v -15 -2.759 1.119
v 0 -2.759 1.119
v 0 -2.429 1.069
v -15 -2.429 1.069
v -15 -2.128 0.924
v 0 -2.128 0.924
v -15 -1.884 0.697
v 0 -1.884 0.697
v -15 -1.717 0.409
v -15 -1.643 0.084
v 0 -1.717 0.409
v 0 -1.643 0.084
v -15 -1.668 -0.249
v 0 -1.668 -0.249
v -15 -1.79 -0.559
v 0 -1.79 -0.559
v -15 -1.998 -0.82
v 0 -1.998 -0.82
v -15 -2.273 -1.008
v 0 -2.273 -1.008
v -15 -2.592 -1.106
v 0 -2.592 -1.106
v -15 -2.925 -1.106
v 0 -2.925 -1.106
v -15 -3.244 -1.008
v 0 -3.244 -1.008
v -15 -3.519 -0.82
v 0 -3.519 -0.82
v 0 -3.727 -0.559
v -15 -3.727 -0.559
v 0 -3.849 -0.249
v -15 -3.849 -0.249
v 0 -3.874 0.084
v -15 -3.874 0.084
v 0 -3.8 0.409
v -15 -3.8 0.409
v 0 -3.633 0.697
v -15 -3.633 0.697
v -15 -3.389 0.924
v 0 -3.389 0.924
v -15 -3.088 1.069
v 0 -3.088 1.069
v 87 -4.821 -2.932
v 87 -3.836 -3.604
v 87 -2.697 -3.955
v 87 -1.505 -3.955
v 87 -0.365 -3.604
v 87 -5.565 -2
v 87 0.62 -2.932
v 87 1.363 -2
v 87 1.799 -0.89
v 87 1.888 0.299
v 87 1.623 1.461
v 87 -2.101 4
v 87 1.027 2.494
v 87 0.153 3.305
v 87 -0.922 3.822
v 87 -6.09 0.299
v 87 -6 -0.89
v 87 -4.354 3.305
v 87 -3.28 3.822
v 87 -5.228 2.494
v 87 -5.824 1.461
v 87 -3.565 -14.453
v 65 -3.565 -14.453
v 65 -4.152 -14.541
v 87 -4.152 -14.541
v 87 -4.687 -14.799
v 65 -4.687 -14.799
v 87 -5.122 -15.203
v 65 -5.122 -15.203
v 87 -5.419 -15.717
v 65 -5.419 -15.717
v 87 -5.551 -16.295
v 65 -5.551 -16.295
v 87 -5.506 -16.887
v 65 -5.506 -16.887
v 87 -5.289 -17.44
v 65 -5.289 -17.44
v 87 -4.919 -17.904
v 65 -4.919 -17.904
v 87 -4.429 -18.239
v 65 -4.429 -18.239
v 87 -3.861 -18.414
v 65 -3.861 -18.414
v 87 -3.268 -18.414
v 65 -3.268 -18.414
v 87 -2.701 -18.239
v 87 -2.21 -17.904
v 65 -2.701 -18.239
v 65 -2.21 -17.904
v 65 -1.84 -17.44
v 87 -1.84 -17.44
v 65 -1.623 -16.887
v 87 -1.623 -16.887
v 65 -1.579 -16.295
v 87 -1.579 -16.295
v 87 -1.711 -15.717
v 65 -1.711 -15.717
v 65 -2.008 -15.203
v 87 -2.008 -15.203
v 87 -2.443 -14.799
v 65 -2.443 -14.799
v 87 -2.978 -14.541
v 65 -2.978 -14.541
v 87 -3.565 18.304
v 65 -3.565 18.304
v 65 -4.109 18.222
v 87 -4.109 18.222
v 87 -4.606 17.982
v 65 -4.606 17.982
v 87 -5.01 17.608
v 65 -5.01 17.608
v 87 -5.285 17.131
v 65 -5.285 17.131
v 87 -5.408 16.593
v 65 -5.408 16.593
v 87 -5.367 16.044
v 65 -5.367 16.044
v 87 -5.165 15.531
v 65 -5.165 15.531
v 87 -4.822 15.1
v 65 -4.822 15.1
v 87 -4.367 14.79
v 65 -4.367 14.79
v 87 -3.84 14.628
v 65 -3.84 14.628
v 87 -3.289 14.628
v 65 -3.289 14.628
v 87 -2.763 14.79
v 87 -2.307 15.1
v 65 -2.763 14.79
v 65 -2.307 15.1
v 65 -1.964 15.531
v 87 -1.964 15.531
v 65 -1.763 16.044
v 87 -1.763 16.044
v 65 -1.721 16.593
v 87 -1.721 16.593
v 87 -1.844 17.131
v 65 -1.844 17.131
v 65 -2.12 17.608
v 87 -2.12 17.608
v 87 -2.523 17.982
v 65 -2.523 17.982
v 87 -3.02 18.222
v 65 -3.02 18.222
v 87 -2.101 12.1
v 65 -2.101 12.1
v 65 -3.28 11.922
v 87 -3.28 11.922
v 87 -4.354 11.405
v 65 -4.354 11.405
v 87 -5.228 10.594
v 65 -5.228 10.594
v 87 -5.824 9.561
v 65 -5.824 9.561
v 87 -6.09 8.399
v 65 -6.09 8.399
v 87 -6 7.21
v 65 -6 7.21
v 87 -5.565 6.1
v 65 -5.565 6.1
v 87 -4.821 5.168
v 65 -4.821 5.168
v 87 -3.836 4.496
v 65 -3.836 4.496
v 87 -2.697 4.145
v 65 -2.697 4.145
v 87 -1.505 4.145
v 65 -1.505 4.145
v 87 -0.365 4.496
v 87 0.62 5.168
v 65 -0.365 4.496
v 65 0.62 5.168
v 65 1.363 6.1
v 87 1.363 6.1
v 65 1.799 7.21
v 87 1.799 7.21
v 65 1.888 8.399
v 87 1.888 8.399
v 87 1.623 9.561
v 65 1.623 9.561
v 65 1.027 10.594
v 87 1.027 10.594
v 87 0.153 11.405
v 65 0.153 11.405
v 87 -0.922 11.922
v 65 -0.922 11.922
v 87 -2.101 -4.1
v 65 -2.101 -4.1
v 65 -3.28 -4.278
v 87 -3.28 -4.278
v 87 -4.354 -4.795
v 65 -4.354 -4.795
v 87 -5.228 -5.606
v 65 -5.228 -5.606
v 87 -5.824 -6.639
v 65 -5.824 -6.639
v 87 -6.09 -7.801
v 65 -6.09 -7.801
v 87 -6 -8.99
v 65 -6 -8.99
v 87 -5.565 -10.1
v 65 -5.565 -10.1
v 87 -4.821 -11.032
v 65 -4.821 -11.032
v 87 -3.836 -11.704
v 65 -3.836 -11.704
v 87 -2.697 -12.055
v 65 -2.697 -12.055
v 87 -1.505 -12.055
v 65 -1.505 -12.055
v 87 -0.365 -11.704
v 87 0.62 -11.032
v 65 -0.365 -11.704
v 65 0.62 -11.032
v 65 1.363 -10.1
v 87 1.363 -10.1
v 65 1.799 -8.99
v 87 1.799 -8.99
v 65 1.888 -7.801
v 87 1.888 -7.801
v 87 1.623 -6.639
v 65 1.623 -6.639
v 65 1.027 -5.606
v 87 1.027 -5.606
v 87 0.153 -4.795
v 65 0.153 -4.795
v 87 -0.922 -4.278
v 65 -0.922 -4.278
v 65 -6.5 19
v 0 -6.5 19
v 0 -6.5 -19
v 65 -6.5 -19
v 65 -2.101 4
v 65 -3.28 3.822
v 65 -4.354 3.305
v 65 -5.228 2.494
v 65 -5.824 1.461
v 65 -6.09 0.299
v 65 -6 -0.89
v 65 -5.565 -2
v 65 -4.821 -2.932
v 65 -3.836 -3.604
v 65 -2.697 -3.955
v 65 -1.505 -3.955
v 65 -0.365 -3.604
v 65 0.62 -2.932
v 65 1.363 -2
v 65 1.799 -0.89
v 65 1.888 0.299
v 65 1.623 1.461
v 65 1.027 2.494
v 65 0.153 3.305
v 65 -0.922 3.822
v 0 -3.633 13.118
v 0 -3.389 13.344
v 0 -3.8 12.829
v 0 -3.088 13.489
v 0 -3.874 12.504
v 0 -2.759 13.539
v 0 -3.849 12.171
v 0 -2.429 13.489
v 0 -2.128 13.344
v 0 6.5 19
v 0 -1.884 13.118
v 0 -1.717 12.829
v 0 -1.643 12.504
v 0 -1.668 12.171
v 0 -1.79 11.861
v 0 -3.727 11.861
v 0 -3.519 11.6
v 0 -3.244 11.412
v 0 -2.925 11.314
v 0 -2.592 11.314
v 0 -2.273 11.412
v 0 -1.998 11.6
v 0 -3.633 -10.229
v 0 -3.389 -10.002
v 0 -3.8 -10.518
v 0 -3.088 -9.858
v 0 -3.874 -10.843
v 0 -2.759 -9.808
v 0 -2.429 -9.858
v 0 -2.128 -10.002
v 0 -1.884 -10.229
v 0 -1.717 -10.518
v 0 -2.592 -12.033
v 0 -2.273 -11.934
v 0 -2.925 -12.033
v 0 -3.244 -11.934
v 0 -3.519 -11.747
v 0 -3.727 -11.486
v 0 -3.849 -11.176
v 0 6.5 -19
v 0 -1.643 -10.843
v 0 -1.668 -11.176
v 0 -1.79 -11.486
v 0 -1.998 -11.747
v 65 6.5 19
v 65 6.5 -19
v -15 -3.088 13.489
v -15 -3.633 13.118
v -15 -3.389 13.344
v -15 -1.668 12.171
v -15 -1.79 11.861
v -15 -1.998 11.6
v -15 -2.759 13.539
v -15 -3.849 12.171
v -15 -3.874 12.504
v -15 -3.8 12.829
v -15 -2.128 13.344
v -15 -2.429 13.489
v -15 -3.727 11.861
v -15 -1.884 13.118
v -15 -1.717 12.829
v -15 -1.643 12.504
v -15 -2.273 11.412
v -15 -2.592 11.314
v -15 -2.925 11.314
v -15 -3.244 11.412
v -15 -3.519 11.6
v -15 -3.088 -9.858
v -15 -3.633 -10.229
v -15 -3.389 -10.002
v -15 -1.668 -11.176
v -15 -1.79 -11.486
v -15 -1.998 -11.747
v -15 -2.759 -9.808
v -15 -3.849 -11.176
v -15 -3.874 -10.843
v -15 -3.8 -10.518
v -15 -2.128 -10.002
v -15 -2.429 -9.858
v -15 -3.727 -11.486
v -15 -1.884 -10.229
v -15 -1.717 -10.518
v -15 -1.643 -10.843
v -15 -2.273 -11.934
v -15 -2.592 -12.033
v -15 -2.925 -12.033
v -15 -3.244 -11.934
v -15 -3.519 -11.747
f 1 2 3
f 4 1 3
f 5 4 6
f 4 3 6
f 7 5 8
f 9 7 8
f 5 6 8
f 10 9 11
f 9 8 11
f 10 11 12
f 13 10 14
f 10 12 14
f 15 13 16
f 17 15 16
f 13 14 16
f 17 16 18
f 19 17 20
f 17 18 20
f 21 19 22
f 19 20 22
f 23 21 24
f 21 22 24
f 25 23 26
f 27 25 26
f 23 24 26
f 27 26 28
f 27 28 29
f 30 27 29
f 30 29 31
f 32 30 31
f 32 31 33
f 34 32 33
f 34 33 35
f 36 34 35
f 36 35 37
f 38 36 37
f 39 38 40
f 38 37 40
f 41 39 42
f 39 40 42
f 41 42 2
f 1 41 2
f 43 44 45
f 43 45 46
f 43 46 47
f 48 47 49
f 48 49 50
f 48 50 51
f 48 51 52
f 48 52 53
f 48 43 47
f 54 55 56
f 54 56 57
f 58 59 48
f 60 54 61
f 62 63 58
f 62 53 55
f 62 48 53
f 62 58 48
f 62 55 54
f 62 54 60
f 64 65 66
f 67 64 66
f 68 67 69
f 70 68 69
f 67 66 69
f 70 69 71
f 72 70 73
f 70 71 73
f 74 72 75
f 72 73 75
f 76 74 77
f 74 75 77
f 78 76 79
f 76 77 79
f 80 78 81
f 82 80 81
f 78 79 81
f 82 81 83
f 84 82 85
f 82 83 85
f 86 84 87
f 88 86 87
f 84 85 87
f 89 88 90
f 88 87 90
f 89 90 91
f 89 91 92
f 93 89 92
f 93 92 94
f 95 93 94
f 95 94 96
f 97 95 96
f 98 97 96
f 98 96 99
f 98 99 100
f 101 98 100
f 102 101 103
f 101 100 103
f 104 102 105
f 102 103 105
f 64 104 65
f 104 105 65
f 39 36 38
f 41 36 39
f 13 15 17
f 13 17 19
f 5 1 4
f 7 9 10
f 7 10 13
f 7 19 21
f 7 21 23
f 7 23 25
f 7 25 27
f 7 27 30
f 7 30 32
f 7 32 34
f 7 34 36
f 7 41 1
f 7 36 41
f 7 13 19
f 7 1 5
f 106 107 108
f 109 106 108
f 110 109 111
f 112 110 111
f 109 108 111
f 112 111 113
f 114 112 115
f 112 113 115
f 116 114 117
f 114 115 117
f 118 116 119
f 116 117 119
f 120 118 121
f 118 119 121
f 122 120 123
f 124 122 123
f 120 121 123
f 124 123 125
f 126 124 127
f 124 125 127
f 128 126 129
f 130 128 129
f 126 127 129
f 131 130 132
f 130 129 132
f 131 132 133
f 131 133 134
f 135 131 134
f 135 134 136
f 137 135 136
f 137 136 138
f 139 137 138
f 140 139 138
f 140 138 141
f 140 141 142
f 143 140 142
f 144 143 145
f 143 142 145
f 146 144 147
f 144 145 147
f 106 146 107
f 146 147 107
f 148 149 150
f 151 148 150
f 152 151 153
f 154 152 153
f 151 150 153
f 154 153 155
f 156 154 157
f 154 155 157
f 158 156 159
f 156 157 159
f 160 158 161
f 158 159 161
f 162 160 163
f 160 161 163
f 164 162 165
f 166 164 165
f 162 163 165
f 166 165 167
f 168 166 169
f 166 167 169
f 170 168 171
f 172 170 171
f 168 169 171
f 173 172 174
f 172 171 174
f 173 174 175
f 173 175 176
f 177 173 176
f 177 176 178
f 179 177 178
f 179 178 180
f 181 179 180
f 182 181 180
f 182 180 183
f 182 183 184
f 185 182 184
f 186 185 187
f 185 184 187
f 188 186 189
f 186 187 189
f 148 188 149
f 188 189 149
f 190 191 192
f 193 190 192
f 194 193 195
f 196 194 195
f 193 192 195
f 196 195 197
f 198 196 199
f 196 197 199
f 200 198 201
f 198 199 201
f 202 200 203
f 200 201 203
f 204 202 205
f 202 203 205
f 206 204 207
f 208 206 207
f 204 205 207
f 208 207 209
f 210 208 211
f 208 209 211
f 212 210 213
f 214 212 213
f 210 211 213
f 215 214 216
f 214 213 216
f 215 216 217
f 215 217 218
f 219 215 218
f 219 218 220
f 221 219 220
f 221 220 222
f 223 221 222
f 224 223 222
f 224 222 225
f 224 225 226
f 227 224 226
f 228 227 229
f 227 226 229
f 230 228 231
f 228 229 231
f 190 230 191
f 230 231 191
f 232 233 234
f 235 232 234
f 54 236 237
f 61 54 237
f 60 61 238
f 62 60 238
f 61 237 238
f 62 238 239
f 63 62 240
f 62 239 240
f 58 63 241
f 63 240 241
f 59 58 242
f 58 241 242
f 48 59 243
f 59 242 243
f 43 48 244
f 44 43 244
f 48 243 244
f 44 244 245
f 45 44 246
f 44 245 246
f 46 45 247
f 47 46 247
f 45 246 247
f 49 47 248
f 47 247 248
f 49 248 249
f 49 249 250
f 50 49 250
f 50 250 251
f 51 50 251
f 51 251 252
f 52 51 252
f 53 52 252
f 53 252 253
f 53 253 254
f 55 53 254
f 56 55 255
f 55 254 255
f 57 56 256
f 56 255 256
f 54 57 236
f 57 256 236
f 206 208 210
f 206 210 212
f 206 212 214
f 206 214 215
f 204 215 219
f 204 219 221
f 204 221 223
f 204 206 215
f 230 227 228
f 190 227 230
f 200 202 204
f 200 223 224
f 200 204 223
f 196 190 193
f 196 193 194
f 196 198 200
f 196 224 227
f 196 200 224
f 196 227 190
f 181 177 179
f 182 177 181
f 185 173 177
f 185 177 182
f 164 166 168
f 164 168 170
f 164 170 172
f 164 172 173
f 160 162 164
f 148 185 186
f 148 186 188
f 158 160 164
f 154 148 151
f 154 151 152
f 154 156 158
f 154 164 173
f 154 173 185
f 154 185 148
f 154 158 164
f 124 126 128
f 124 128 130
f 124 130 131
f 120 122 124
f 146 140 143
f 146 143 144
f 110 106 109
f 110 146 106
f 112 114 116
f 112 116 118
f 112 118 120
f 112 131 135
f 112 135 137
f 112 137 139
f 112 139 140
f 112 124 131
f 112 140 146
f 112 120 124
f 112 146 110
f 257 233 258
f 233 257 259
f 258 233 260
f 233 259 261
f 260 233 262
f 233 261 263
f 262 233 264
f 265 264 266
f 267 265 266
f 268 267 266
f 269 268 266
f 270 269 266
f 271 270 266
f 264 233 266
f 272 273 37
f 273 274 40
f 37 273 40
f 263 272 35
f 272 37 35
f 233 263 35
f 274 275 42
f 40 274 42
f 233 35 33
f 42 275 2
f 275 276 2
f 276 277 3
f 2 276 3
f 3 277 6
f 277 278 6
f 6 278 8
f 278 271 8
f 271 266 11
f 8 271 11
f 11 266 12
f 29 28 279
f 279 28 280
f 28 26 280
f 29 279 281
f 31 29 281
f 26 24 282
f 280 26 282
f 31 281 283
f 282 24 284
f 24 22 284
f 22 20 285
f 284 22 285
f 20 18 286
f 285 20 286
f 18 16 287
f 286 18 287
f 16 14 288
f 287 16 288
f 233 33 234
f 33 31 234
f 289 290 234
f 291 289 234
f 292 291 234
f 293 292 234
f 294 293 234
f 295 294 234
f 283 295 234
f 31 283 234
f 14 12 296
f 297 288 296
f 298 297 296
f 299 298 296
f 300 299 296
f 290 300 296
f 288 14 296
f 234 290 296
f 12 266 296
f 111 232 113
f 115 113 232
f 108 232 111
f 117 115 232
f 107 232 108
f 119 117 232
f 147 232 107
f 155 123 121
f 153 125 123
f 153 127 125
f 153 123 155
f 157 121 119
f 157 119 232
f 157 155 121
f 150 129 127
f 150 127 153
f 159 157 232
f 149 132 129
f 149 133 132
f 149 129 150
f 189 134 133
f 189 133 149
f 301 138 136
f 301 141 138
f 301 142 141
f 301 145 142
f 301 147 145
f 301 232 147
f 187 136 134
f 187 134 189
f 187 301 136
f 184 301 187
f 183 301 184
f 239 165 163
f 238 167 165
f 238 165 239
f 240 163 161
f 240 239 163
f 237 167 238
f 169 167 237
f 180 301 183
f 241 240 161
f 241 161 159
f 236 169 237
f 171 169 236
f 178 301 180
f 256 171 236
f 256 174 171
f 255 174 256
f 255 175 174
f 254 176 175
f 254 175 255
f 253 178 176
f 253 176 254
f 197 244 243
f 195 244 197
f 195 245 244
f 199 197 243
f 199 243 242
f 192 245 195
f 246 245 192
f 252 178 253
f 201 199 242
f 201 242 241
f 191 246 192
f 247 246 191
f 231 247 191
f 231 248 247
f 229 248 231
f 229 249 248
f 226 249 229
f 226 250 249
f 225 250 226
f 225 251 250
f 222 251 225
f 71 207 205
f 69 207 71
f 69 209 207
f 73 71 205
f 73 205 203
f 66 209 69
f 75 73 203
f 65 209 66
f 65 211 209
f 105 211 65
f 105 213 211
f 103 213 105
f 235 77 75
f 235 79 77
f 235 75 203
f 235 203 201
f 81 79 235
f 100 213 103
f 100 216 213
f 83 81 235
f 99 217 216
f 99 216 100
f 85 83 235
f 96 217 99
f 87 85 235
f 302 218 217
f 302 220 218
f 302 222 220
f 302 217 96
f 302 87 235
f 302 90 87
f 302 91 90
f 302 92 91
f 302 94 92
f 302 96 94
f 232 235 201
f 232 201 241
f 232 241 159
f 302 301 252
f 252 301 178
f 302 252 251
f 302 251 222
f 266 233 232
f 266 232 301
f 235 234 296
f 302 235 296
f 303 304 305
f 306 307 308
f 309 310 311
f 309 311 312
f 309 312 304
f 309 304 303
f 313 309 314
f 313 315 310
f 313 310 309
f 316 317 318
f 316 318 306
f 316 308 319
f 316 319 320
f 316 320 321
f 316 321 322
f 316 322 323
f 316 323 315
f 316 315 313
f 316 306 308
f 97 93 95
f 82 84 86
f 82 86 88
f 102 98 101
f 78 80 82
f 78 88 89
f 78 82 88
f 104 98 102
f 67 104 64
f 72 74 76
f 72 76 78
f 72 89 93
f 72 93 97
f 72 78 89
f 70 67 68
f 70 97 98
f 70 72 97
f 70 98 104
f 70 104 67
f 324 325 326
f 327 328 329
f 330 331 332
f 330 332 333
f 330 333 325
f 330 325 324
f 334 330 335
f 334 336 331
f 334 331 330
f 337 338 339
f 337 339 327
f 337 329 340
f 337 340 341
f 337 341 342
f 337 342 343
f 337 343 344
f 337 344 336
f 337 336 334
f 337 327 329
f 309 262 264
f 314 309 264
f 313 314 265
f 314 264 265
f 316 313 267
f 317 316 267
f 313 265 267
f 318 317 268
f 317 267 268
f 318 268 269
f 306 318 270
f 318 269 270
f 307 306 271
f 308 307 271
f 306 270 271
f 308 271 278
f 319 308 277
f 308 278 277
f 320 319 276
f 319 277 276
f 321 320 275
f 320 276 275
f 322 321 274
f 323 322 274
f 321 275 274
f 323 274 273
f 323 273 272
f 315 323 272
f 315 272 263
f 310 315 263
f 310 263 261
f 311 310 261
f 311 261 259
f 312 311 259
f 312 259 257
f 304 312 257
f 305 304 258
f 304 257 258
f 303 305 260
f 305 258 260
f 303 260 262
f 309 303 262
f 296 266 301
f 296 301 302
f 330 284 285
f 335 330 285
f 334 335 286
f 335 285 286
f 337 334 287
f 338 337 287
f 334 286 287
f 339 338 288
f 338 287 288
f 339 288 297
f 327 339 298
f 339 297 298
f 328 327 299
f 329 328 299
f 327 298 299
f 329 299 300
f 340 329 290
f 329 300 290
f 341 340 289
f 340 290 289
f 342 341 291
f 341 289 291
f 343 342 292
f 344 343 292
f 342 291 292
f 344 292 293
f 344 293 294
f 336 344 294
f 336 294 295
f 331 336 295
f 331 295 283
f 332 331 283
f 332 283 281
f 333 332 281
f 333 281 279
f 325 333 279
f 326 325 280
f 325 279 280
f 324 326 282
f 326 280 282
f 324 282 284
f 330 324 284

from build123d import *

# Parameters (mm, degrees)
SKETCH1_W           = 38
SKETCH1_H           = 13
BOSS_EXTRUDE1_DEPTH = 65
SKETCH2_R           = 1.848381342
SKETCH2_R_2         = 4
SKETCH2_R_3         = 1.991530231
BOSS_EXTRUDE4_DEPTH = 22
SKETCH3_R           = 1.118624503
BOSS_EXTRUDE5_DEPTH = 15


with BuildPart() as part:
    # Sketch1 → Boss-Extrude1 (new body)
    with BuildSketch(Plane(origin=(0, 0, 0), x_dir=(0, 0, -1), z_dir=(1, 0, 0))):
        Rectangle(SKETCH1_W, SKETCH1_H)
    extrude(amount=BOSS_EXTRUDE1_DEPTH)

    # Sketch2 → Boss-Extrude4 (add)
    with BuildSketch(Plane(origin=(65, 0, 0), x_dir=(0, 0, -1), z_dir=(1, 0, 0))):
        with Locations(Location((-16.455259224, -3.564649458, 0), (0, 0, 180))):
            Circle(SKETCH2_R)
        with Locations(Location((-8.1, -2.100713402, 0), (0, 0, 180))):
            Circle(SKETCH2_R_2)
        with Locations(Location((0, -2.100713402, 0), (0, 0, 180))):
            Circle(SKETCH2_R_2)
        with Locations(Location((8.1, -2.100713402, 0), (0, 0, 180))):
            Circle(SKETCH2_R_2)
        with Locations(Location((16.444267151, -3.564649458, 0), (0, 0, 180))):
            Circle(SKETCH2_R_3)
    extrude(amount=BOSS_EXTRUDE4_DEPTH)

    # Sketch3 → Boss-Extrude5 (add)
    with BuildSketch(Plane.ZY):
        with Locations((-10.926639498, -2.758613366)):
            Circle(SKETCH3_R)
        with Locations((0, -2.758613366)):
            Circle(SKETCH3_R)
        with Locations((12.420208926, -2.758613366)):
            Circle(SKETCH3_R)
    extrude(amount=BOSS_EXTRUDE5_DEPTH)


solid = part.part
